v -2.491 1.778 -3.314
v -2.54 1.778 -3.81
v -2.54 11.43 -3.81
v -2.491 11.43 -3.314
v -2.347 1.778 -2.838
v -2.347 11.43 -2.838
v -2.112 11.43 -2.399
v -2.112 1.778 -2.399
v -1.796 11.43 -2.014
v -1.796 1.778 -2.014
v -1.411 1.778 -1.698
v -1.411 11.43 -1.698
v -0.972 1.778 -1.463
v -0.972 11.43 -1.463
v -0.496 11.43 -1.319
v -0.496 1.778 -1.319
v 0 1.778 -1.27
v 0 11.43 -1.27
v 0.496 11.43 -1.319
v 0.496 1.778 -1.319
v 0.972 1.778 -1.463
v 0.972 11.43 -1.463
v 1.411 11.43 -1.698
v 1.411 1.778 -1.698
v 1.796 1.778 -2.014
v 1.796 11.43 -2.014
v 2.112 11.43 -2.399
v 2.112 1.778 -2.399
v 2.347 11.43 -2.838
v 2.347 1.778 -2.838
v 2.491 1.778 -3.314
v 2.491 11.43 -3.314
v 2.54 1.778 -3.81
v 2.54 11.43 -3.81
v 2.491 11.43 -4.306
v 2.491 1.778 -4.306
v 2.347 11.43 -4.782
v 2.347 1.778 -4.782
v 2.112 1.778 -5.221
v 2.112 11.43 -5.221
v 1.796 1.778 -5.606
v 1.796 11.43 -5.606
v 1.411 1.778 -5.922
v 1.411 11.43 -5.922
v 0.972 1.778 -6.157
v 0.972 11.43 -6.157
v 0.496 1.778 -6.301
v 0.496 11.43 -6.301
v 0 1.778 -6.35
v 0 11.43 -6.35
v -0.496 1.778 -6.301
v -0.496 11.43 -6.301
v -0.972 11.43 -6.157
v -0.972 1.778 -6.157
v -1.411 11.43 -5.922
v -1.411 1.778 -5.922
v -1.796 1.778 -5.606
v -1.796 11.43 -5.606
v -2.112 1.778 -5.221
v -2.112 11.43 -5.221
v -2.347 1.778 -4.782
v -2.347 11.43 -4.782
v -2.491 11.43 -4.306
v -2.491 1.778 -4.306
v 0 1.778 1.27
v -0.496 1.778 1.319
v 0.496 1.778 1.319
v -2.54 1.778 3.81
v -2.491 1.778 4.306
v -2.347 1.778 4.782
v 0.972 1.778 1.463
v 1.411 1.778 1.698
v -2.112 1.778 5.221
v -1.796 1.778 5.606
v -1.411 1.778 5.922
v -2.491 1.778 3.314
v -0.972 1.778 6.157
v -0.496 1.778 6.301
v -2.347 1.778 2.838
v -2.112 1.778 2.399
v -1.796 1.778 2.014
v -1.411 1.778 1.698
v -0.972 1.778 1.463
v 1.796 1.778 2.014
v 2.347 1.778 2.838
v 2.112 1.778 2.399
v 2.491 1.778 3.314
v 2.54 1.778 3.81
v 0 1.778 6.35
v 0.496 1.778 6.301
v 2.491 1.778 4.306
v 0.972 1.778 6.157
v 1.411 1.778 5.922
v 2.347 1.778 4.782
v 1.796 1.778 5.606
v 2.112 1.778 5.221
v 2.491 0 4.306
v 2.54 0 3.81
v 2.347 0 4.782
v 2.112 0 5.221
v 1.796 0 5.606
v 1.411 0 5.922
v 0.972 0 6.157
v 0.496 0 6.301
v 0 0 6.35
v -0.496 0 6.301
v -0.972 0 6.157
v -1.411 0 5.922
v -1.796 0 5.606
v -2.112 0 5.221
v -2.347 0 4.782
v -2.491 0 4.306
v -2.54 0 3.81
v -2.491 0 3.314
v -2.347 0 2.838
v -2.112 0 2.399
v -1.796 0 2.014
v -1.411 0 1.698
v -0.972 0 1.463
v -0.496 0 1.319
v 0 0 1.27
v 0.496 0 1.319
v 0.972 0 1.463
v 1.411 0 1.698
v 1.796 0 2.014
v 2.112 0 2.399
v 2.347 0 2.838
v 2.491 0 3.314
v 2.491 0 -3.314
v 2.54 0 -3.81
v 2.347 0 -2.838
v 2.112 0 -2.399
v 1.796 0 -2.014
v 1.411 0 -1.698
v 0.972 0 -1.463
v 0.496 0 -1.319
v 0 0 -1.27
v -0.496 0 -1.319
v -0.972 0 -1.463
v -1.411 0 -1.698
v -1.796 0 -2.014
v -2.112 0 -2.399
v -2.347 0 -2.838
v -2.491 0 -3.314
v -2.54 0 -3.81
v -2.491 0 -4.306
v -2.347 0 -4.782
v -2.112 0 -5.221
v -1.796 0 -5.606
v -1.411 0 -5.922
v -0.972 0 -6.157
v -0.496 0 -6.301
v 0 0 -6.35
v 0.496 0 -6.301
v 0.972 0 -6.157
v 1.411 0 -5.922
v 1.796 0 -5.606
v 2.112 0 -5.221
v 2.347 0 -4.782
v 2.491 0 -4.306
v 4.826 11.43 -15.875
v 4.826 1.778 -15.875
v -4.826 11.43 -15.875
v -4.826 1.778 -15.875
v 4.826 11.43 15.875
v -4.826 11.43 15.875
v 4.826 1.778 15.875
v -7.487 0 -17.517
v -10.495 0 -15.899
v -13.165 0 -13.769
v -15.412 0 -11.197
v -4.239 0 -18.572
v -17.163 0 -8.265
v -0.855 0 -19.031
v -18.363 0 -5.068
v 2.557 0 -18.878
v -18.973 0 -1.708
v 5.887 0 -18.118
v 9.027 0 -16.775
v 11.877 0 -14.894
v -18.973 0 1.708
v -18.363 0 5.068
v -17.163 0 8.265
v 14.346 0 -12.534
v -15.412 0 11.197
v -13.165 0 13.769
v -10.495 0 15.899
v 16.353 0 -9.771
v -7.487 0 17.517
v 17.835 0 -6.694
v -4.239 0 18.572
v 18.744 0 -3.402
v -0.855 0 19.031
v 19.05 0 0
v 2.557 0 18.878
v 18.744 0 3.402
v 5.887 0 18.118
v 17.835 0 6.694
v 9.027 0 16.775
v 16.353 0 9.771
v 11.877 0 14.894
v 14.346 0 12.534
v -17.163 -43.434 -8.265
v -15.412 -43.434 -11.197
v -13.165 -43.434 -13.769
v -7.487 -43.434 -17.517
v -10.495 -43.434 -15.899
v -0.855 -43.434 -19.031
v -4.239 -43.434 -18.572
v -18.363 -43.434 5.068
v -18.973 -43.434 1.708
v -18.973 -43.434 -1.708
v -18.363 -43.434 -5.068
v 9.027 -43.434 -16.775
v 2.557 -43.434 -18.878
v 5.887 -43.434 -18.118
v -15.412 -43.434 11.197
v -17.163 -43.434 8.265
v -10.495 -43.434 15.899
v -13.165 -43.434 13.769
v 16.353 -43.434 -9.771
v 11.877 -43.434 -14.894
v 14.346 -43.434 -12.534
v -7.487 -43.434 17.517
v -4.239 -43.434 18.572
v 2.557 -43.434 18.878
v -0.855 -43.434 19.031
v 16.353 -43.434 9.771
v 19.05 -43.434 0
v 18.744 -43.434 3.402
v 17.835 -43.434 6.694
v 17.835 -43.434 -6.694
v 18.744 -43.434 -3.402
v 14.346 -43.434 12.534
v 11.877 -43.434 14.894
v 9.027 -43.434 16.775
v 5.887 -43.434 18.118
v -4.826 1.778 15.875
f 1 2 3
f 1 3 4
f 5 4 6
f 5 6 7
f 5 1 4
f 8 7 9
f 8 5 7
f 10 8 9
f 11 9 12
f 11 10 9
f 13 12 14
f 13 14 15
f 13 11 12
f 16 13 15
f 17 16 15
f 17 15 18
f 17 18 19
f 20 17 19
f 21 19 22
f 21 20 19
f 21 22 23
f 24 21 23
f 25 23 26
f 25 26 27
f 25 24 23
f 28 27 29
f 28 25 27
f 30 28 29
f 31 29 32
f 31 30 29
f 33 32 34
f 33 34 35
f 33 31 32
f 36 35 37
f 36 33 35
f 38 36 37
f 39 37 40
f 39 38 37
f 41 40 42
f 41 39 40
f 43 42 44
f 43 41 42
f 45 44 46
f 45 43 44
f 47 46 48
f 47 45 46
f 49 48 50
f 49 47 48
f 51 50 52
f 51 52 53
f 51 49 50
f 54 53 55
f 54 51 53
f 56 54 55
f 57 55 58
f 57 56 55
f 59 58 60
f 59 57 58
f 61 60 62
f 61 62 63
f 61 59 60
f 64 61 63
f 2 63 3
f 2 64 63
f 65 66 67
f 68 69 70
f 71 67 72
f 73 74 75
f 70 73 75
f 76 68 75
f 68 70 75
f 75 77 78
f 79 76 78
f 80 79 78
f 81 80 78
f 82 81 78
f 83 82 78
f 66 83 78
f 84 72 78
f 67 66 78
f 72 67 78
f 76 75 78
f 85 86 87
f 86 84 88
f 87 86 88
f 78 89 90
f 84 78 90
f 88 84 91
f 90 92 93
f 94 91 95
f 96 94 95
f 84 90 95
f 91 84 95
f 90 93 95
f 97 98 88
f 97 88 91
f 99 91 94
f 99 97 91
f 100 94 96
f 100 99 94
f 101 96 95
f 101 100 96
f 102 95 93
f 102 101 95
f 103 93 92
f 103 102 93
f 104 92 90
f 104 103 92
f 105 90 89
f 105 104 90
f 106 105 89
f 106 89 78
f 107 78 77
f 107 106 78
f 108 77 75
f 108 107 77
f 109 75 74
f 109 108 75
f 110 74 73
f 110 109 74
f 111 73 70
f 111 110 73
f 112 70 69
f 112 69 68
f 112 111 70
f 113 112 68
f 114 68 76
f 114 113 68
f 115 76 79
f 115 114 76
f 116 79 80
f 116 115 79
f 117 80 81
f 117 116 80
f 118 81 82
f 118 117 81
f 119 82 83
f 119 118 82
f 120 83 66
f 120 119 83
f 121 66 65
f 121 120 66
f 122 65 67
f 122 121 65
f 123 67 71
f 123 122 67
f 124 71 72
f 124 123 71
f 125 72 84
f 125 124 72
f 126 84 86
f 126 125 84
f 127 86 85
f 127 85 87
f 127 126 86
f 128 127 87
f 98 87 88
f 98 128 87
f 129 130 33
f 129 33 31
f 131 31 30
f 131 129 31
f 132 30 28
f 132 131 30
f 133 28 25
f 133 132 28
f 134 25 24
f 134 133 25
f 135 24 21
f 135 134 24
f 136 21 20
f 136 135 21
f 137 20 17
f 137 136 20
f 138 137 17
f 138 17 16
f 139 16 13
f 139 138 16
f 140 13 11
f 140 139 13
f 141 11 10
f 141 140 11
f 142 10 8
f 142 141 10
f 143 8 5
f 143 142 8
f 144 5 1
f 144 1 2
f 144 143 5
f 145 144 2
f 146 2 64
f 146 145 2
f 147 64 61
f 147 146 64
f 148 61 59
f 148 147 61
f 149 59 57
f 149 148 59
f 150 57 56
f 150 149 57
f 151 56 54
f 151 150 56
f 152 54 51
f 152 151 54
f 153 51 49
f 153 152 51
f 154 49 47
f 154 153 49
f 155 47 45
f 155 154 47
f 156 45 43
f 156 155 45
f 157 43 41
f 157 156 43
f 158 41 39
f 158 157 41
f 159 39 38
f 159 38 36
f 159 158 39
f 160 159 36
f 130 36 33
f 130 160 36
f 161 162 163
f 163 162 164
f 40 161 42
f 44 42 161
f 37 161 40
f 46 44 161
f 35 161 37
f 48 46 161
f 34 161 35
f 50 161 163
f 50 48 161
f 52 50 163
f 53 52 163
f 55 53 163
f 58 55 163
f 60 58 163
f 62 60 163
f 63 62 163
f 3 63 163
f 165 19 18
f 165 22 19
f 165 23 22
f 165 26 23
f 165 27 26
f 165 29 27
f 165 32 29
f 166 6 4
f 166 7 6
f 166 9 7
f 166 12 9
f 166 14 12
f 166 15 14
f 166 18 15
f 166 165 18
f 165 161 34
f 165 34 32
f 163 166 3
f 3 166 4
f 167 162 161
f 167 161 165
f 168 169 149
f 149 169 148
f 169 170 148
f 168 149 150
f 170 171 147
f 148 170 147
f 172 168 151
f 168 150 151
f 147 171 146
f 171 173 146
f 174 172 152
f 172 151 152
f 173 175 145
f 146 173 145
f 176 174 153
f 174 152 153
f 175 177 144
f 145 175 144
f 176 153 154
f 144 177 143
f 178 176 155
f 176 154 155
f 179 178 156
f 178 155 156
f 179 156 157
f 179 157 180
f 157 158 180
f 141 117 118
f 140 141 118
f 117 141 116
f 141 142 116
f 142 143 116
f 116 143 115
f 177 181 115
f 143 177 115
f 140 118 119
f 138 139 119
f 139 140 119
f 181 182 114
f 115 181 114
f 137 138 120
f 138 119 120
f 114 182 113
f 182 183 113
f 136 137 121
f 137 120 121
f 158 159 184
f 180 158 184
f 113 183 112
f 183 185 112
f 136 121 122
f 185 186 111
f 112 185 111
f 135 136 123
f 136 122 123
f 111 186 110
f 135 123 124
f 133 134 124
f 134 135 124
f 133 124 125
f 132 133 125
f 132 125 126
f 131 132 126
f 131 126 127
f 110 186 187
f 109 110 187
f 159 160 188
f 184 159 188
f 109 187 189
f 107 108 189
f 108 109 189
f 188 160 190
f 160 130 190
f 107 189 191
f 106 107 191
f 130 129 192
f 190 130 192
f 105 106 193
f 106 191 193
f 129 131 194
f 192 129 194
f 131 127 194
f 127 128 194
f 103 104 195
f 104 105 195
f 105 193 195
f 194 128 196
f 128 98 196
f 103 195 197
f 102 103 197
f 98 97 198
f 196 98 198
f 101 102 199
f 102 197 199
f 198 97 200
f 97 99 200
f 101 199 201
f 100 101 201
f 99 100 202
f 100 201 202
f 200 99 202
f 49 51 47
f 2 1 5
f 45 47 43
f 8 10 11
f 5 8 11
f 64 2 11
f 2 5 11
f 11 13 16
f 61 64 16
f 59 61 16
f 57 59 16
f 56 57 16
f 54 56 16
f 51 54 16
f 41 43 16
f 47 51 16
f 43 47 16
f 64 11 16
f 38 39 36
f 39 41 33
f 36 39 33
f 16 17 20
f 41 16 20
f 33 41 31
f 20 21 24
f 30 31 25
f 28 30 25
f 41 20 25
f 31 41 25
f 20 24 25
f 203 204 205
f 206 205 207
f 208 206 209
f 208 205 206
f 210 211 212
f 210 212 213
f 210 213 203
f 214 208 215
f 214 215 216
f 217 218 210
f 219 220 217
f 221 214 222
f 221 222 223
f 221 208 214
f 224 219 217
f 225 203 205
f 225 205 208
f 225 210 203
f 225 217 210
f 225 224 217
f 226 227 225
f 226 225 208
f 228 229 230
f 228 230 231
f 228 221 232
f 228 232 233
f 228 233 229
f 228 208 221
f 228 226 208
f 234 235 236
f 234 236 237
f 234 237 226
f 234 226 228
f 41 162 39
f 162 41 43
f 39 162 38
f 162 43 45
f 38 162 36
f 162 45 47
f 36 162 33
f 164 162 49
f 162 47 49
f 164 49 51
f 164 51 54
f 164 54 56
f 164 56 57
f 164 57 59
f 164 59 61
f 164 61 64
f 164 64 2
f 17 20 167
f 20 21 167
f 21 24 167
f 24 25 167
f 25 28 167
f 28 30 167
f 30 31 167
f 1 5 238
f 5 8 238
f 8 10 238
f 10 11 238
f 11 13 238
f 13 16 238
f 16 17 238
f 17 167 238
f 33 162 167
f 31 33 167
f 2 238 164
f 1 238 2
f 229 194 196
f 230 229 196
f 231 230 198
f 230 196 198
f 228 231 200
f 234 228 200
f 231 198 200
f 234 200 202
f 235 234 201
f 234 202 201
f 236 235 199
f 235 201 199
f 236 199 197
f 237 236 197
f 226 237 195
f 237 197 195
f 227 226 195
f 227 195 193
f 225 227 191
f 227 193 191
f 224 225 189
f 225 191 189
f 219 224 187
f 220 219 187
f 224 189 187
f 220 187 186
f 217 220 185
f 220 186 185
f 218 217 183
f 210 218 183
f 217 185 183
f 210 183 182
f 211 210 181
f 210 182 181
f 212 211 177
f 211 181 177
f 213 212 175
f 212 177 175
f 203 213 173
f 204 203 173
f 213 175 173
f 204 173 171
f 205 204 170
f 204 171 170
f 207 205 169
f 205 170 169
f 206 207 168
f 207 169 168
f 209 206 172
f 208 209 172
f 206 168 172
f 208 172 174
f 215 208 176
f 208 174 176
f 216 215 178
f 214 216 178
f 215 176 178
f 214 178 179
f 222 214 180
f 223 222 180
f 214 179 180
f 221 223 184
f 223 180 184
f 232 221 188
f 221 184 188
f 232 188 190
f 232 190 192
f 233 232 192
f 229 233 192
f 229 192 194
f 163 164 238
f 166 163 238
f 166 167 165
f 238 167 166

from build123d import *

# Parameters (mm, degrees)
F0_R     = 19.05
F1_DEPTH = 43.434
F2_R     = 2.54
F3_DEPTH = 1.778
F4_W     = 9.652
F4_H     = 31.75
F4_R     = 2.54
F5_DEPTH = 9.652


with BuildPart() as f1:
    # F0 (on Front) → F1 (new body)
    with BuildSketch(Plane.XZ):
        Circle(F0_R)
    extrude(amount=F1_DEPTH)

    # F2 (on Front) → F3 (join)
    with BuildSketch(Plane.XZ):
        with Locations((0, -3.81)):
            Circle(F2_R)
        with Locations((0, 3.81)):
            Circle(F2_R)
    extrude(amount=-F3_DEPTH)


with BuildPart() as f5:
    # F4 (on face) → F5 (new body)
    with BuildSketch(Plane(origin=(0, 1.778, 0), x_dir=(-1, 0, 0), z_dir=(0, 1, 0))):
        Rectangle(F4_W, F4_H)
        with Locations((0, -3.81)):
            Circle(F4_R, mode=Mode.SUBTRACT)
    extrude(amount=F5_DEPTH)


solid = Compound([f1.part, f5.part])
